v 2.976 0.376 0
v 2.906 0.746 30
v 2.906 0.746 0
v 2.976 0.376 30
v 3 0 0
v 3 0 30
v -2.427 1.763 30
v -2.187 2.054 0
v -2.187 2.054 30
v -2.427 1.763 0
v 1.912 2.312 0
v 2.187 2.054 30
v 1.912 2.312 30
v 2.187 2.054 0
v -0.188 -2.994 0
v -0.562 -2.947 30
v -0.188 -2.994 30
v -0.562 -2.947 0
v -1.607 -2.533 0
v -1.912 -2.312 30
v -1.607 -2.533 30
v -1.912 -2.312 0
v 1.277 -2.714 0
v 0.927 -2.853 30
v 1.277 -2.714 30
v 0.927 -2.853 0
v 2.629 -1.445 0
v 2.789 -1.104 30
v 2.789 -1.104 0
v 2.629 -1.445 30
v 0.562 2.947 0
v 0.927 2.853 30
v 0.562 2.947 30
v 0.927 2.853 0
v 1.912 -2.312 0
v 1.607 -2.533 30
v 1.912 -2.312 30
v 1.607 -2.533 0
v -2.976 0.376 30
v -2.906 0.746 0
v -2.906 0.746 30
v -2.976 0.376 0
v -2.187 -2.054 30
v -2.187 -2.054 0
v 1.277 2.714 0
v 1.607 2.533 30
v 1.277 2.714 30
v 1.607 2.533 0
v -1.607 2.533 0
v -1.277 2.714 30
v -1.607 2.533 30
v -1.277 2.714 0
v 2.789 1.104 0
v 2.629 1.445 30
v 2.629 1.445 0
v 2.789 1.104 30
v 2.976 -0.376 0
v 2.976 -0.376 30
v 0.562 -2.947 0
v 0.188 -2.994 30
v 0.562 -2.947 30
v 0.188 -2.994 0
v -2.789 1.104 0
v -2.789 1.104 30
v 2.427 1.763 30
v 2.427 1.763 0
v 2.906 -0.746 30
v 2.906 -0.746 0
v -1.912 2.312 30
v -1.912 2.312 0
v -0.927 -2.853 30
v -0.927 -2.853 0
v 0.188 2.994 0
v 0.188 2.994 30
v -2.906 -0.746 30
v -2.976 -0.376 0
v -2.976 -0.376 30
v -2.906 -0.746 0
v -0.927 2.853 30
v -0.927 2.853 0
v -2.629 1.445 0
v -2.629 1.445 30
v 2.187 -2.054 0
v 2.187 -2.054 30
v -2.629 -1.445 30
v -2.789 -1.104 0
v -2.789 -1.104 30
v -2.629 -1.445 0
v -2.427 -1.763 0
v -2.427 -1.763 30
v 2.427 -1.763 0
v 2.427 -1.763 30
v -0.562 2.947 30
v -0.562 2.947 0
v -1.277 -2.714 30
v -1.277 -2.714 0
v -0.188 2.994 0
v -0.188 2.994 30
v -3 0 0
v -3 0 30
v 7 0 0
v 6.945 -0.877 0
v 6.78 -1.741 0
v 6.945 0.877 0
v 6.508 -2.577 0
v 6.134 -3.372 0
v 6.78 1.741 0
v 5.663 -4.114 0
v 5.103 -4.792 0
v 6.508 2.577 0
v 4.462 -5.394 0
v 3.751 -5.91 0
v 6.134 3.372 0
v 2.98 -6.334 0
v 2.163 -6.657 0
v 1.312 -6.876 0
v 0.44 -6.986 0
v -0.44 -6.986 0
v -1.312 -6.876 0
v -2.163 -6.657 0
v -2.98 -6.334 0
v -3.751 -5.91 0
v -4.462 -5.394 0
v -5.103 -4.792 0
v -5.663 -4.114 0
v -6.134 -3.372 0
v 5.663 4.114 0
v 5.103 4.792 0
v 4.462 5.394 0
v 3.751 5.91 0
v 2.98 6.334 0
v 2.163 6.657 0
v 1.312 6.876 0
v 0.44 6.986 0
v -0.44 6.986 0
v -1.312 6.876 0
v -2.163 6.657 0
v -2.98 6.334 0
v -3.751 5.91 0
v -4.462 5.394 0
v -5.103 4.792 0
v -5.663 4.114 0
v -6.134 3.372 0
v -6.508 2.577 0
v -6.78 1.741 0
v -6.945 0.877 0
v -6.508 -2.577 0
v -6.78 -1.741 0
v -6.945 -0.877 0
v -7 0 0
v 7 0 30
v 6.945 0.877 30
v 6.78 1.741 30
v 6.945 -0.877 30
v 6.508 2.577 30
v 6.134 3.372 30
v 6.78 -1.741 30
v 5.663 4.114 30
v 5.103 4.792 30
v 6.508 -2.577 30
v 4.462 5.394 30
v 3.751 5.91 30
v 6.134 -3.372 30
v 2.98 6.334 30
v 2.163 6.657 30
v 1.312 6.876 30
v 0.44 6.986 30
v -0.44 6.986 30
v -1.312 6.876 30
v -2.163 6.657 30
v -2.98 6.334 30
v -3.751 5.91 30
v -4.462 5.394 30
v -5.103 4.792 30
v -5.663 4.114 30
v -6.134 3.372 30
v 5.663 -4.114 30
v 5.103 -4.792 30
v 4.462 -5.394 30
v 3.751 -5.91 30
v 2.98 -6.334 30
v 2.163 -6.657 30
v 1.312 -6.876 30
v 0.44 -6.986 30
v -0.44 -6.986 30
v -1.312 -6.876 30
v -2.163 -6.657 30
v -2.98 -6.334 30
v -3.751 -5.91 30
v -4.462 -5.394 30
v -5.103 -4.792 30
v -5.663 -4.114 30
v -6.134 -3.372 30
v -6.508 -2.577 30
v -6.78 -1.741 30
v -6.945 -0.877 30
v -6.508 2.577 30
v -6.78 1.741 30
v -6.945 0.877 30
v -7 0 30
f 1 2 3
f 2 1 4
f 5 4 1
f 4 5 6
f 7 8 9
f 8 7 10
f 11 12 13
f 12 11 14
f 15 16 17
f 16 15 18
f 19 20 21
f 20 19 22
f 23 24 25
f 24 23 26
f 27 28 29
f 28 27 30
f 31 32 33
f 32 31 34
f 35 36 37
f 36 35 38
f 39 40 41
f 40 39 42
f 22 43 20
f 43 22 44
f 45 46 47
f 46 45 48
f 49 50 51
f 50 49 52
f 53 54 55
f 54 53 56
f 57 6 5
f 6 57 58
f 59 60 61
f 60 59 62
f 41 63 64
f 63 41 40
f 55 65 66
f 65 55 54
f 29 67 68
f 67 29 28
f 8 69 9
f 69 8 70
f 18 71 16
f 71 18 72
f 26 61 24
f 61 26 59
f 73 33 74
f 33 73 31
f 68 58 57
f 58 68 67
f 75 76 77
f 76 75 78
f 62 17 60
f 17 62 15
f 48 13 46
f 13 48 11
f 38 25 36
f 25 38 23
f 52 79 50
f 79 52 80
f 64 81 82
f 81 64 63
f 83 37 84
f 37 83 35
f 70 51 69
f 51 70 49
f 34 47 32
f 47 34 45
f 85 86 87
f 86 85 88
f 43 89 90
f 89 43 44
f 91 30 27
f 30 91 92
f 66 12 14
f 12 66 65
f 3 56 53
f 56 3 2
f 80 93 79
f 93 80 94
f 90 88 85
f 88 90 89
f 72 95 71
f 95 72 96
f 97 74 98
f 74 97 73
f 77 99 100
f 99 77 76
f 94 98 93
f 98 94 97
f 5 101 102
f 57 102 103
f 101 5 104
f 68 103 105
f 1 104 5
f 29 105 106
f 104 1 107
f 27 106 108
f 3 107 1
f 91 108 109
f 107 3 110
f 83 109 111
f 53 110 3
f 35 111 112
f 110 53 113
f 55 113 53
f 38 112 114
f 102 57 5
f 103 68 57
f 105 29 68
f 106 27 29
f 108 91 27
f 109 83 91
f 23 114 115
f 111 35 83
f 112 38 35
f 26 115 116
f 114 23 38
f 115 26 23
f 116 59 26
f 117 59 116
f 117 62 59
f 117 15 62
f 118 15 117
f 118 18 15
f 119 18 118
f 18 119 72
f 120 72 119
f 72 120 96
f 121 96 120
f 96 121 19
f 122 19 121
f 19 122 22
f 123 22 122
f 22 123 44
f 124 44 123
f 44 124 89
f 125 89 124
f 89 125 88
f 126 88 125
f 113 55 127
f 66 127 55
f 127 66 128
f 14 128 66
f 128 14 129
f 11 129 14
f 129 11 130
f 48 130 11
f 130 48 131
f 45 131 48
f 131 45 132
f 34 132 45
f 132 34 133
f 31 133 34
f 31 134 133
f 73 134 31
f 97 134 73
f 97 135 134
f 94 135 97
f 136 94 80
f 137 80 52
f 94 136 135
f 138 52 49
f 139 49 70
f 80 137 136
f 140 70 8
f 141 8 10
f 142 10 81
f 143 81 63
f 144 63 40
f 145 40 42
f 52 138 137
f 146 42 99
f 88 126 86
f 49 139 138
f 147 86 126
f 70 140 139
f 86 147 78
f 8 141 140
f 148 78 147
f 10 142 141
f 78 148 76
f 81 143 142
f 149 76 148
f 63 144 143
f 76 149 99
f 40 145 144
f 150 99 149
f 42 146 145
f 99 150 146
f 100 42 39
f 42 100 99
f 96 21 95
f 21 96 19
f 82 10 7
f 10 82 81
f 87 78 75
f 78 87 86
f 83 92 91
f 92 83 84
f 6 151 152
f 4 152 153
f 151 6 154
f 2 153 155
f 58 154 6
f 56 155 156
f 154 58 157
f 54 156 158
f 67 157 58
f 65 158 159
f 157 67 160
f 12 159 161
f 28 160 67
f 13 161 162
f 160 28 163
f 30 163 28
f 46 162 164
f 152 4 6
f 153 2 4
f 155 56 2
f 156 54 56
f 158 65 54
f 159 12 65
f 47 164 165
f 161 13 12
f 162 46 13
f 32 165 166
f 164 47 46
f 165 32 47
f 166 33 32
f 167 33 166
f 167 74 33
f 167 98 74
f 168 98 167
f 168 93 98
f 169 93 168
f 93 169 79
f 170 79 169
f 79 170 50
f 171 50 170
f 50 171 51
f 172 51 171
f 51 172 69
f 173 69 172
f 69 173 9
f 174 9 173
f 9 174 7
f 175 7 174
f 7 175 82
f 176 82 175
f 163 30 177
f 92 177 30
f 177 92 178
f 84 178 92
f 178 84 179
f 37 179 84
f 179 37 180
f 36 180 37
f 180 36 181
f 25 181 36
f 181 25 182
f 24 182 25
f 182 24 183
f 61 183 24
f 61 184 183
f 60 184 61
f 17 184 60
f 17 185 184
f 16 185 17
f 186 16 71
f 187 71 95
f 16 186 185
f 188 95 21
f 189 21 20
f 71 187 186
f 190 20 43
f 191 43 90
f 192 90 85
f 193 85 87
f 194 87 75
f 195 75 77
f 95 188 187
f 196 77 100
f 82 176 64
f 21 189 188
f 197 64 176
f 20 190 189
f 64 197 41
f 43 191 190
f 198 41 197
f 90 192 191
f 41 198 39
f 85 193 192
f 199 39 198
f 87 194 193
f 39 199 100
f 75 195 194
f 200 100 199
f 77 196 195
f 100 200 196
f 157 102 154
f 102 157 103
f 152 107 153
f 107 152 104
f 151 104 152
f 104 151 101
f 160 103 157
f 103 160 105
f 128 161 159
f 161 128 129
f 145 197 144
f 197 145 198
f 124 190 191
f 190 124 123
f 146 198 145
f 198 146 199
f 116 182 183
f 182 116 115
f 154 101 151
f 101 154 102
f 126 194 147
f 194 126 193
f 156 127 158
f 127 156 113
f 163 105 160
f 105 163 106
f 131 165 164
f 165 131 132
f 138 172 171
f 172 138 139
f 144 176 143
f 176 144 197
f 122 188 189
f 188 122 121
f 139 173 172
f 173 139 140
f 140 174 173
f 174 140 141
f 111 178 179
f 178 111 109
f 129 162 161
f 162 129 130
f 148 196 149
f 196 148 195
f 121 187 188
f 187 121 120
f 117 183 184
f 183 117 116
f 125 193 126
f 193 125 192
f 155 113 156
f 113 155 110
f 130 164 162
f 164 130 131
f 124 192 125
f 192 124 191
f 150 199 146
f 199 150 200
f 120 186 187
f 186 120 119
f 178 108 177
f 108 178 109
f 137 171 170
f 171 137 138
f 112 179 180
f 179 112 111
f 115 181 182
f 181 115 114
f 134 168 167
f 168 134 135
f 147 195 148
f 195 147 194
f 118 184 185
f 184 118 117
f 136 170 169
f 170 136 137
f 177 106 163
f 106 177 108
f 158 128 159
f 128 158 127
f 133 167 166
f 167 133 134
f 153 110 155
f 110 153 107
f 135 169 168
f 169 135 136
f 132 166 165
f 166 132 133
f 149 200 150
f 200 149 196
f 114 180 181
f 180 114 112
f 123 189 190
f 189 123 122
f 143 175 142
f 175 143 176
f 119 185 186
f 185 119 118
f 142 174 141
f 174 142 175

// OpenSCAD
$fn = 50;

difference() {
	union() {
		cylinder(h = 30, r = 7.0);
	}
	union() {
		cylinder(h = 30, r = 3.0);
		cylinder(h = 30, r = 1.5);
	}
}
